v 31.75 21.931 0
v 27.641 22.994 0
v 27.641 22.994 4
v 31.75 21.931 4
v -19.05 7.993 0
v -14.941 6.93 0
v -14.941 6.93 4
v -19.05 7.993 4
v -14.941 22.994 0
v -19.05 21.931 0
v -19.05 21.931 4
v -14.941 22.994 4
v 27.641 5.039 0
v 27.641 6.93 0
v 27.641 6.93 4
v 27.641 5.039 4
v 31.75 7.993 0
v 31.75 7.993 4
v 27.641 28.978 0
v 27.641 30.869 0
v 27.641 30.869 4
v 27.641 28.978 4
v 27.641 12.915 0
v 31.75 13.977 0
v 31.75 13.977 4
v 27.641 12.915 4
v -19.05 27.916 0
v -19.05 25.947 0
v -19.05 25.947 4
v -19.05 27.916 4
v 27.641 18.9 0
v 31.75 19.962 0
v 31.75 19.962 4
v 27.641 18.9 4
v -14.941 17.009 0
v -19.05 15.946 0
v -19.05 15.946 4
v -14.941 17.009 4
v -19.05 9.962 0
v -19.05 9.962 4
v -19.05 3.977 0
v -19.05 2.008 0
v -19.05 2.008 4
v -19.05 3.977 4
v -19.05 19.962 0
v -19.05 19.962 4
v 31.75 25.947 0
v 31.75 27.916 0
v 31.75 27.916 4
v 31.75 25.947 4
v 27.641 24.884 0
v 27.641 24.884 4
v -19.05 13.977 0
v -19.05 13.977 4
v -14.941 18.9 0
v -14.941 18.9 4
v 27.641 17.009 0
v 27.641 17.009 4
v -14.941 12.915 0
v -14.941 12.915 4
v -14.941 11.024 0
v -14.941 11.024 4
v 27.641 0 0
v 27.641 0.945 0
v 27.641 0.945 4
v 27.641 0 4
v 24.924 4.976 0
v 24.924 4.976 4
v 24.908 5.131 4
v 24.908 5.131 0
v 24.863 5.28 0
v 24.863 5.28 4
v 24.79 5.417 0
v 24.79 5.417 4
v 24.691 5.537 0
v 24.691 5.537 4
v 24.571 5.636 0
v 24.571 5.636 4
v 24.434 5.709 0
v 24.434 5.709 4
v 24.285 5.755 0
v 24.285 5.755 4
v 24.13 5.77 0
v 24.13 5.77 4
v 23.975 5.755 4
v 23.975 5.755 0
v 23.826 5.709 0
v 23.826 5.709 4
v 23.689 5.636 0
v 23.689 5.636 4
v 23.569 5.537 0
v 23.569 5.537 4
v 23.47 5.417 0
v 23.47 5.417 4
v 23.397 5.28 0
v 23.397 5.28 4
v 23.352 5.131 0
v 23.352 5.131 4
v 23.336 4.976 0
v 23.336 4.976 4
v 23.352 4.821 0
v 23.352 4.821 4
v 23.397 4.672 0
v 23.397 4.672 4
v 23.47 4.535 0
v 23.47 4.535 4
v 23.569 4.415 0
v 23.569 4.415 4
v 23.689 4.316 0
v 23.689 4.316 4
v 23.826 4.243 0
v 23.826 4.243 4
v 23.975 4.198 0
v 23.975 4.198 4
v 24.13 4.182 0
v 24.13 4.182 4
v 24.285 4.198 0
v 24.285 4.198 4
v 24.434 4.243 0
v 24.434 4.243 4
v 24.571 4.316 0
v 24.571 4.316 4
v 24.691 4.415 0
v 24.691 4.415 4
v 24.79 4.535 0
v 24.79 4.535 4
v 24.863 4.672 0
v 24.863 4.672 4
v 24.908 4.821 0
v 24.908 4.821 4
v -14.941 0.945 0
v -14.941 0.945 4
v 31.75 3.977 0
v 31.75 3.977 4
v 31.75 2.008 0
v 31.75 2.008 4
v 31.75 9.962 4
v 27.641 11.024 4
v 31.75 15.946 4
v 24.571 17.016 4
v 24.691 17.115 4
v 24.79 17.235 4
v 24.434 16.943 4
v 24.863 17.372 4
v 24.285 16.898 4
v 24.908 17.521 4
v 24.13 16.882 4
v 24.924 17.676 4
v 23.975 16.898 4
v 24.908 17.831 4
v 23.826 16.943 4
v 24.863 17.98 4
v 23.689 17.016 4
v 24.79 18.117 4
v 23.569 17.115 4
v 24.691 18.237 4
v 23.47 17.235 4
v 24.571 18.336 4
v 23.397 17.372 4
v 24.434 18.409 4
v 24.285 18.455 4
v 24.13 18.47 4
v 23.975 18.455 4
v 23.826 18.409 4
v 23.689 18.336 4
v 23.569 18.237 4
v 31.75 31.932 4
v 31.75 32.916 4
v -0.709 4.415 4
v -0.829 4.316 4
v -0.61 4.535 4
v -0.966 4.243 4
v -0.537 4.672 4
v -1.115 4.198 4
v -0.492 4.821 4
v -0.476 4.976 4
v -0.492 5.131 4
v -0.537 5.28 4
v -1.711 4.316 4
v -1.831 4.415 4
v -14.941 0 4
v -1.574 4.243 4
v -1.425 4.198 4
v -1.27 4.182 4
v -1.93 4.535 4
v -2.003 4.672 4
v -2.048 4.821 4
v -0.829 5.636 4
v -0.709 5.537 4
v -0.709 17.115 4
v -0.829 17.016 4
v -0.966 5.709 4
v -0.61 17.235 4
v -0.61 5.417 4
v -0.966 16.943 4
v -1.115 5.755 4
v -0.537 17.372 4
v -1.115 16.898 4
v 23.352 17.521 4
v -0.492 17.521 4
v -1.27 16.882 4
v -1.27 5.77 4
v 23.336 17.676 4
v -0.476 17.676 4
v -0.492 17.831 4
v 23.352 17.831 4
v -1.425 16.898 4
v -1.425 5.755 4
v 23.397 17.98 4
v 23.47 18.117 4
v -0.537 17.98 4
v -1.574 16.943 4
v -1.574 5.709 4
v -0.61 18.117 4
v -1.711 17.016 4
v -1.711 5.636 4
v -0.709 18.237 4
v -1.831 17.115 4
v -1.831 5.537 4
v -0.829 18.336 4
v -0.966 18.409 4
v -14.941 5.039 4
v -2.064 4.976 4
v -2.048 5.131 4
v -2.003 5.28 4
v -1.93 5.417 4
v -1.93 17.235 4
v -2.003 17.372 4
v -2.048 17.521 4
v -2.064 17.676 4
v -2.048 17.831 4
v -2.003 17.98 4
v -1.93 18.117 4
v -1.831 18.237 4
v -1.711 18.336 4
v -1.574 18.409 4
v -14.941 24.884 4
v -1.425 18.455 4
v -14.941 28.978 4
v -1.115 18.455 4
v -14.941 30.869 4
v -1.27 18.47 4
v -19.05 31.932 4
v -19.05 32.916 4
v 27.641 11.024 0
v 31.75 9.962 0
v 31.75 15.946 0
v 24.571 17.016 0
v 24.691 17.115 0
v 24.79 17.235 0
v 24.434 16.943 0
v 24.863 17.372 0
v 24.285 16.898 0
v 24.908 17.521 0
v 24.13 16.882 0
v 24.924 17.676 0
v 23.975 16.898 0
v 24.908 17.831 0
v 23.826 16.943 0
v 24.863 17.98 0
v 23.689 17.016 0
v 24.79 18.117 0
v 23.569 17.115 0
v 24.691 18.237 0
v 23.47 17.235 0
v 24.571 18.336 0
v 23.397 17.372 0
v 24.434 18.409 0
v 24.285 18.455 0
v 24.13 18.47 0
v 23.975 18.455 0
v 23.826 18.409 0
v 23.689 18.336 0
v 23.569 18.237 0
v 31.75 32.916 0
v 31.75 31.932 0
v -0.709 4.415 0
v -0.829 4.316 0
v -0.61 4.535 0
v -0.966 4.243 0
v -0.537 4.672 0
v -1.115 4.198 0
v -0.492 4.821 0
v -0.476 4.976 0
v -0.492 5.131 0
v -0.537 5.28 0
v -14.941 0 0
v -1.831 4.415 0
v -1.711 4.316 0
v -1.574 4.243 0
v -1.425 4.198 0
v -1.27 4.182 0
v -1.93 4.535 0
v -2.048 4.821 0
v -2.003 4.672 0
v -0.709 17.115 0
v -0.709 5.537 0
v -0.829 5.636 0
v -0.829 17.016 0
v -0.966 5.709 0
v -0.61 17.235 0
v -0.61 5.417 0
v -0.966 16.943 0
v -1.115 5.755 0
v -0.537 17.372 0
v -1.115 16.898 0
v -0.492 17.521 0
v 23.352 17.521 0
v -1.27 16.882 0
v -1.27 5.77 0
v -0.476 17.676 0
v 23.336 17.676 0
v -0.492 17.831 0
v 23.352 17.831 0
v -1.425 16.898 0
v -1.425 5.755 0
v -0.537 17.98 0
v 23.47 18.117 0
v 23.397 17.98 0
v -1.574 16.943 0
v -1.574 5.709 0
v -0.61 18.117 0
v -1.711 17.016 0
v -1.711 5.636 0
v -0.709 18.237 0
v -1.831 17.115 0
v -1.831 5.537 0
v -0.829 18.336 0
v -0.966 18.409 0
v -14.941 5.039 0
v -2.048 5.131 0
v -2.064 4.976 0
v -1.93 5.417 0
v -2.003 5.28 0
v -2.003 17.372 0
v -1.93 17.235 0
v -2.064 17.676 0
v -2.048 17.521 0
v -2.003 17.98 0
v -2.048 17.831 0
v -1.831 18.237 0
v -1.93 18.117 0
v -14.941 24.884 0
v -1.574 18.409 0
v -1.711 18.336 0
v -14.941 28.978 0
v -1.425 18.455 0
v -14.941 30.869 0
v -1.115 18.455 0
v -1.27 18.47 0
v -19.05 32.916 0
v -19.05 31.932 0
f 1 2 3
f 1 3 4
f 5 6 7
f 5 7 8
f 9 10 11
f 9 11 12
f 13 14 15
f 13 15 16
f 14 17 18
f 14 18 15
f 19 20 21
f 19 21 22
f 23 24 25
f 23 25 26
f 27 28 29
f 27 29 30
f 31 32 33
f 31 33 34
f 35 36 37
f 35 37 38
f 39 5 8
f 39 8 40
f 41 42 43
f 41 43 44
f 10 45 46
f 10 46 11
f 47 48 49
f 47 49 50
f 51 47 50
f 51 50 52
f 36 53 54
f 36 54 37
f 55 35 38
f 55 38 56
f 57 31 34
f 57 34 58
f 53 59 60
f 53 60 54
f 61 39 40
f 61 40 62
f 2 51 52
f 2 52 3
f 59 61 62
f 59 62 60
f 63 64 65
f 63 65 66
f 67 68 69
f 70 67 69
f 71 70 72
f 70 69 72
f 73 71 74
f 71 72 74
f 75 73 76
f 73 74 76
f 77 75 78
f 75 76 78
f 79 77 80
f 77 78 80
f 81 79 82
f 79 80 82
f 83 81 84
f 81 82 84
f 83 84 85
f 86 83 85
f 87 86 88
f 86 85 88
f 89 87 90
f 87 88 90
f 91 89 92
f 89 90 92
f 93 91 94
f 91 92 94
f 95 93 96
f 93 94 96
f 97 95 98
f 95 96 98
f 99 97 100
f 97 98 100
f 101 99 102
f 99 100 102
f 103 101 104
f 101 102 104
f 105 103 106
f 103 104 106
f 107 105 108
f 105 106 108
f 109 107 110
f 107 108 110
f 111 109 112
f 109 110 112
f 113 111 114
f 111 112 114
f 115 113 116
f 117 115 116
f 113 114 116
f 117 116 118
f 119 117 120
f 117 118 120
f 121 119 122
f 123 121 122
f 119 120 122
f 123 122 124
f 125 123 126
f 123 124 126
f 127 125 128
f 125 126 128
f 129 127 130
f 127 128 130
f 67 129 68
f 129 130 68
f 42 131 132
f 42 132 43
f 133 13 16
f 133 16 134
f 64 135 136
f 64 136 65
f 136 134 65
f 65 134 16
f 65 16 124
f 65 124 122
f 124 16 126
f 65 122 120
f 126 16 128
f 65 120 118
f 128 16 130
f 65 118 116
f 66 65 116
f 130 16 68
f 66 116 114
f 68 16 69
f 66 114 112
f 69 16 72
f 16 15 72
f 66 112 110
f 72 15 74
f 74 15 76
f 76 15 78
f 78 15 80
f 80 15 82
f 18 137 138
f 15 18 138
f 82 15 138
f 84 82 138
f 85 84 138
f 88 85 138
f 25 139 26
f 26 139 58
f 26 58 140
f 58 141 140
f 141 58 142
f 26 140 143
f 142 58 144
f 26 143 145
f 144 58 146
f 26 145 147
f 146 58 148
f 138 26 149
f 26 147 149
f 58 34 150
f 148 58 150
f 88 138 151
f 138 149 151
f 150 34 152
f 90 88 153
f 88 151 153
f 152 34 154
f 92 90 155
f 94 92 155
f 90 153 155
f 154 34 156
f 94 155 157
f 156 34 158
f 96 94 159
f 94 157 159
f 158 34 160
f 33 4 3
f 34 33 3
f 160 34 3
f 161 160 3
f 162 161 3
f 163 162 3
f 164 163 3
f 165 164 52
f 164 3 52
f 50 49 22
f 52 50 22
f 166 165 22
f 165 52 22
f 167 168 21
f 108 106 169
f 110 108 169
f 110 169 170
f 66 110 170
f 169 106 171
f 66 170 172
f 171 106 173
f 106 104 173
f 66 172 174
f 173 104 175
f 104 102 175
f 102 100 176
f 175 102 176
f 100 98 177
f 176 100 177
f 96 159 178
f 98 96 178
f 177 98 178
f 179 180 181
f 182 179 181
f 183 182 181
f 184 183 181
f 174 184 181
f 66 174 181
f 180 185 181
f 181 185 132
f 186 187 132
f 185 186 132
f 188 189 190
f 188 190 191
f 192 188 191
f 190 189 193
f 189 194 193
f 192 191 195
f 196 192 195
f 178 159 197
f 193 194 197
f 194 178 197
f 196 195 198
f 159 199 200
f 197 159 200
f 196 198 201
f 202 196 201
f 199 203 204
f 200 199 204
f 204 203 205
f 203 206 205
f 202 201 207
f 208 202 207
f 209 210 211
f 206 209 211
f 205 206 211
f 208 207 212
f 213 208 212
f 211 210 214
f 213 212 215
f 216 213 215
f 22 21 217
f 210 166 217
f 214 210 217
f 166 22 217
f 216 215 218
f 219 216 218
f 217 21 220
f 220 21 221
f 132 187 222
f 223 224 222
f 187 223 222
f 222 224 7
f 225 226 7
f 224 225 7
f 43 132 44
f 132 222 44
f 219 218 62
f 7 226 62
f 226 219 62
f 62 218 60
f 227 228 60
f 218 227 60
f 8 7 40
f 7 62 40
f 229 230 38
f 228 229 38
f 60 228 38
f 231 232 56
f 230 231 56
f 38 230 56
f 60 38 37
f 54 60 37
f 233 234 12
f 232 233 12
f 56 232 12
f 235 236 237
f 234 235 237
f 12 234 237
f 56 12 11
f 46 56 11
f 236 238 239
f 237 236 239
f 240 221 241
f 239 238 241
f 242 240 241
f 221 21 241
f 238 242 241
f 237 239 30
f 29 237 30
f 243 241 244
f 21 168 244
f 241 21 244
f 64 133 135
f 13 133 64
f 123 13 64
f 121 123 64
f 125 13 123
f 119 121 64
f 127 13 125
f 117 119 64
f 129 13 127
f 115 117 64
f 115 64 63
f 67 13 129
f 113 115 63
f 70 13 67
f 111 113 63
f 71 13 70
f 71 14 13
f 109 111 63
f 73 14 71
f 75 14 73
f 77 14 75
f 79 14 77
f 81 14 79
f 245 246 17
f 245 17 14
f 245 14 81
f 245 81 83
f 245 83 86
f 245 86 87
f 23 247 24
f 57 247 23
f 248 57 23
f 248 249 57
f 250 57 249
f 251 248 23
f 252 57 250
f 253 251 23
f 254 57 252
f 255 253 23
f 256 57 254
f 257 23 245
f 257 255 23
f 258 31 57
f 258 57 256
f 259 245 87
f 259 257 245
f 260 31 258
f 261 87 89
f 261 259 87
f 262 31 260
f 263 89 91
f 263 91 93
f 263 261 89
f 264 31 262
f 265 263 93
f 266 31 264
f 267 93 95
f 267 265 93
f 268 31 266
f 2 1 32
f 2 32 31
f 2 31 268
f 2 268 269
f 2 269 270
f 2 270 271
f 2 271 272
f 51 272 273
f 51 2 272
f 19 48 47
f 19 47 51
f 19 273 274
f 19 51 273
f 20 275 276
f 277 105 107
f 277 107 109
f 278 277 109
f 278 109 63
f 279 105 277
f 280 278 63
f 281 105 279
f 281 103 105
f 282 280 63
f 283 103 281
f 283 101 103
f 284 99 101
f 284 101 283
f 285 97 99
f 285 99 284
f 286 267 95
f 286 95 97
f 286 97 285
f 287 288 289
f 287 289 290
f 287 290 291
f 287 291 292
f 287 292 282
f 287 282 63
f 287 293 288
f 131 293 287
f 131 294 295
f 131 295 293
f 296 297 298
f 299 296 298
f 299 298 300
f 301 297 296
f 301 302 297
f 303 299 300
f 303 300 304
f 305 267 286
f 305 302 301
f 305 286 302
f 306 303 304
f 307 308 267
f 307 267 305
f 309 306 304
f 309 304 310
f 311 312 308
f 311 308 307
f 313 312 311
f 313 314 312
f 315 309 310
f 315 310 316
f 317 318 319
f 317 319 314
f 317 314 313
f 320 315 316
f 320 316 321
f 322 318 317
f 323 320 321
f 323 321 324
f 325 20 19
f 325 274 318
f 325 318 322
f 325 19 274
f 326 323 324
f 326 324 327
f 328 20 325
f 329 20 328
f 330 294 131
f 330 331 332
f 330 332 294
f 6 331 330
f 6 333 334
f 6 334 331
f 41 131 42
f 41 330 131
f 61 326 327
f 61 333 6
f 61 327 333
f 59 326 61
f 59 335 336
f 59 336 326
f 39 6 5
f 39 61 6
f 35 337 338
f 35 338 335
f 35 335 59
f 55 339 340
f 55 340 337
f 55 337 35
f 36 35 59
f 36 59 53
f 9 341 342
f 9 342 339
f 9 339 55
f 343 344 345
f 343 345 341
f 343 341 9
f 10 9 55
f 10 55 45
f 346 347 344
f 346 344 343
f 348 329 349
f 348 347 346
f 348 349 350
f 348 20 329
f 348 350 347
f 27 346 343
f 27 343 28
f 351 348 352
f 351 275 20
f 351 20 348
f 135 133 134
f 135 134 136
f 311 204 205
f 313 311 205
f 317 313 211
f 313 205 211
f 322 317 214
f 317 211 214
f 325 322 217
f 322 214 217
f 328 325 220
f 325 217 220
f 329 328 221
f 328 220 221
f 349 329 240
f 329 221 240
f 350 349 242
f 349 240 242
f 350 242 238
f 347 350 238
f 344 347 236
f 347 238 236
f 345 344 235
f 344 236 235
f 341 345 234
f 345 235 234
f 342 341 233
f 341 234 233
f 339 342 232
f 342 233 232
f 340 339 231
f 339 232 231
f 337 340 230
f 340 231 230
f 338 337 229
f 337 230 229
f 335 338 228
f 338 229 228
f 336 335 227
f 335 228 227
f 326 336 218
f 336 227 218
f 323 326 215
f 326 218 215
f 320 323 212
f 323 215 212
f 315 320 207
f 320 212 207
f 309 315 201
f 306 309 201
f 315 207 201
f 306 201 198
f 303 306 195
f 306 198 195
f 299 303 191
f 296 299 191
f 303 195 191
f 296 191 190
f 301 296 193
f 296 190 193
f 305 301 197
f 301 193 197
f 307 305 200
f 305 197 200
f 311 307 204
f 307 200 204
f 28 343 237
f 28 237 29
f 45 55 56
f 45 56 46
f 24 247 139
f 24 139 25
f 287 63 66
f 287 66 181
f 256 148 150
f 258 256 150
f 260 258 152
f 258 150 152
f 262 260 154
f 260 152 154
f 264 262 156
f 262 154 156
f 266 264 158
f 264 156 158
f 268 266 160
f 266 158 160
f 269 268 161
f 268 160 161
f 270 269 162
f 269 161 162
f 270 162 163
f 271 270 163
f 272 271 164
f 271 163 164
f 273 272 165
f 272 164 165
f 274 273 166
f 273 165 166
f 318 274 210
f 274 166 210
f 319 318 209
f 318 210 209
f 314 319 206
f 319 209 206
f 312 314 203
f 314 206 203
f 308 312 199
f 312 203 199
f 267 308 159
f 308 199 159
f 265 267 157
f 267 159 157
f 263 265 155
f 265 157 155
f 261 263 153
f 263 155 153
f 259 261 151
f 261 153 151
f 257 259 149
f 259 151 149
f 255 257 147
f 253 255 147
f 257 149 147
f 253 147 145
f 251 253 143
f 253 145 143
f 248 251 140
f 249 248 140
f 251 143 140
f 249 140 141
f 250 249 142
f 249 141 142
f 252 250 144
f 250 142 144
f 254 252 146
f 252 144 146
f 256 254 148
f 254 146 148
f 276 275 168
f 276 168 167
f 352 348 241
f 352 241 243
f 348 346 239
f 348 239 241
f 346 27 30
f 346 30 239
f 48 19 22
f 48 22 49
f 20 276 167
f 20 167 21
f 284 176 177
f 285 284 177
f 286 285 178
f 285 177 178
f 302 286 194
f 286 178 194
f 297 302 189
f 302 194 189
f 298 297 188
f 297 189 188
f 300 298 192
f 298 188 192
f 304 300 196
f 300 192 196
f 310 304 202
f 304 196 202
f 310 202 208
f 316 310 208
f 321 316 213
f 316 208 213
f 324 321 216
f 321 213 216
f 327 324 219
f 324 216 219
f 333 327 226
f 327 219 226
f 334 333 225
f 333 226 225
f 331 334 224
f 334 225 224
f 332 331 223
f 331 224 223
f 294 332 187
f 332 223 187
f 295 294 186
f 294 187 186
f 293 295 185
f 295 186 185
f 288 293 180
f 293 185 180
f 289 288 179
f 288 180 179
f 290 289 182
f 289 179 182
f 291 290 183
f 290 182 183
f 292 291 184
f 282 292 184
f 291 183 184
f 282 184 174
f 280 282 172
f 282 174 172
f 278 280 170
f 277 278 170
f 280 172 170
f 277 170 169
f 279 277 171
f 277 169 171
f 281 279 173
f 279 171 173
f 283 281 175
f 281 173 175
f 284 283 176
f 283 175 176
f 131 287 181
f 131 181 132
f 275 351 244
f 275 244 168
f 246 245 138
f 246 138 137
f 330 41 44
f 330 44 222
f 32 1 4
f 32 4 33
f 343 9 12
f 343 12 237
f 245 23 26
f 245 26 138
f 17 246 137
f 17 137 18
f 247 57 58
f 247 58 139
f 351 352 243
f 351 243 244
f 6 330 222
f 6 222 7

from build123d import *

# Parameters (mm, degrees)
BOSS_EXTRUDE1_DEPTH = 4
SKETCH2_R           = 0.79375
CUT_EXTRUDE1_DEPTH  = 4


with BuildPart() as part:
    # Sketch1 → Boss-Extrude1 (new body)
    with BuildSketch(Plane.XY):
        Polygon((-19.05, 32.916114), (31.75, 32.916114), (31.75, 31.931727843), (27.640915, 30.869046207), (27.640915, 28.978433793), (31.75, 27.915752157), (31.75, 25.946979843), (27.640915, 24.884298207), (27.640915, 22.993685793), (31.75, 21.931004157), (31.75, 19.962231843), (27.640915, 18.899550207), (27.640915, 17.008937793), (31.75, 15.946256157), (31.75, 13.977483843), (27.640915, 12.914802207), (27.640915, 11.024189793), (31.75, 9.961508157), (31.75, 7.992735843), (27.640915, 6.930054207), (27.640915, 5.039441793), (31.75, 3.976760157), (31.75, 2.007987843), (27.640915, 0.945306207), (27.640915, 0), (-14.940915, 0), (-14.940915, 0.945306207), (-19.05, 2.007987843), (-19.05, 3.976760157), (-14.940915, 5.039441793), (-14.940915, 6.930054207), (-19.05, 7.992735843), (-19.05, 9.961508157), (-14.940915, 11.024189793), (-14.940915, 12.914802207), (-19.05, 13.977483843), (-19.05, 15.946256157), (-14.940915, 17.008937793), (-14.940915, 18.899550207), (-19.05, 19.962231843), (-19.05, 21.931004157), (-14.940915, 22.993685793), (-14.940915, 24.884298207), (-19.05, 25.946979843), (-19.05, 27.915752157), (-14.940915, 28.978433793), (-14.940915, 30.869046207), (-19.05, 31.931727843), align=None)
    extrude(amount=BOSS_EXTRUDE1_DEPTH)

    # Sketch2 → Cut-Extrude1 (cut)
    with BuildSketch(Plane.XY.offset(4)):
        with Locations((-1.27, 17.676114)):
            Circle(SKETCH2_R)
        with Locations((24.13, 17.676114)):
            Circle(SKETCH2_R)
        with Locations((24.13, 4.976114)):
            Circle(SKETCH2_R)
        with Locations((-1.27, 4.976114)):
            Circle(SKETCH2_R)
    extrude(amount=-CUT_EXTRUDE1_DEPTH, mode=Mode.SUBTRACT)


solid = part.part
